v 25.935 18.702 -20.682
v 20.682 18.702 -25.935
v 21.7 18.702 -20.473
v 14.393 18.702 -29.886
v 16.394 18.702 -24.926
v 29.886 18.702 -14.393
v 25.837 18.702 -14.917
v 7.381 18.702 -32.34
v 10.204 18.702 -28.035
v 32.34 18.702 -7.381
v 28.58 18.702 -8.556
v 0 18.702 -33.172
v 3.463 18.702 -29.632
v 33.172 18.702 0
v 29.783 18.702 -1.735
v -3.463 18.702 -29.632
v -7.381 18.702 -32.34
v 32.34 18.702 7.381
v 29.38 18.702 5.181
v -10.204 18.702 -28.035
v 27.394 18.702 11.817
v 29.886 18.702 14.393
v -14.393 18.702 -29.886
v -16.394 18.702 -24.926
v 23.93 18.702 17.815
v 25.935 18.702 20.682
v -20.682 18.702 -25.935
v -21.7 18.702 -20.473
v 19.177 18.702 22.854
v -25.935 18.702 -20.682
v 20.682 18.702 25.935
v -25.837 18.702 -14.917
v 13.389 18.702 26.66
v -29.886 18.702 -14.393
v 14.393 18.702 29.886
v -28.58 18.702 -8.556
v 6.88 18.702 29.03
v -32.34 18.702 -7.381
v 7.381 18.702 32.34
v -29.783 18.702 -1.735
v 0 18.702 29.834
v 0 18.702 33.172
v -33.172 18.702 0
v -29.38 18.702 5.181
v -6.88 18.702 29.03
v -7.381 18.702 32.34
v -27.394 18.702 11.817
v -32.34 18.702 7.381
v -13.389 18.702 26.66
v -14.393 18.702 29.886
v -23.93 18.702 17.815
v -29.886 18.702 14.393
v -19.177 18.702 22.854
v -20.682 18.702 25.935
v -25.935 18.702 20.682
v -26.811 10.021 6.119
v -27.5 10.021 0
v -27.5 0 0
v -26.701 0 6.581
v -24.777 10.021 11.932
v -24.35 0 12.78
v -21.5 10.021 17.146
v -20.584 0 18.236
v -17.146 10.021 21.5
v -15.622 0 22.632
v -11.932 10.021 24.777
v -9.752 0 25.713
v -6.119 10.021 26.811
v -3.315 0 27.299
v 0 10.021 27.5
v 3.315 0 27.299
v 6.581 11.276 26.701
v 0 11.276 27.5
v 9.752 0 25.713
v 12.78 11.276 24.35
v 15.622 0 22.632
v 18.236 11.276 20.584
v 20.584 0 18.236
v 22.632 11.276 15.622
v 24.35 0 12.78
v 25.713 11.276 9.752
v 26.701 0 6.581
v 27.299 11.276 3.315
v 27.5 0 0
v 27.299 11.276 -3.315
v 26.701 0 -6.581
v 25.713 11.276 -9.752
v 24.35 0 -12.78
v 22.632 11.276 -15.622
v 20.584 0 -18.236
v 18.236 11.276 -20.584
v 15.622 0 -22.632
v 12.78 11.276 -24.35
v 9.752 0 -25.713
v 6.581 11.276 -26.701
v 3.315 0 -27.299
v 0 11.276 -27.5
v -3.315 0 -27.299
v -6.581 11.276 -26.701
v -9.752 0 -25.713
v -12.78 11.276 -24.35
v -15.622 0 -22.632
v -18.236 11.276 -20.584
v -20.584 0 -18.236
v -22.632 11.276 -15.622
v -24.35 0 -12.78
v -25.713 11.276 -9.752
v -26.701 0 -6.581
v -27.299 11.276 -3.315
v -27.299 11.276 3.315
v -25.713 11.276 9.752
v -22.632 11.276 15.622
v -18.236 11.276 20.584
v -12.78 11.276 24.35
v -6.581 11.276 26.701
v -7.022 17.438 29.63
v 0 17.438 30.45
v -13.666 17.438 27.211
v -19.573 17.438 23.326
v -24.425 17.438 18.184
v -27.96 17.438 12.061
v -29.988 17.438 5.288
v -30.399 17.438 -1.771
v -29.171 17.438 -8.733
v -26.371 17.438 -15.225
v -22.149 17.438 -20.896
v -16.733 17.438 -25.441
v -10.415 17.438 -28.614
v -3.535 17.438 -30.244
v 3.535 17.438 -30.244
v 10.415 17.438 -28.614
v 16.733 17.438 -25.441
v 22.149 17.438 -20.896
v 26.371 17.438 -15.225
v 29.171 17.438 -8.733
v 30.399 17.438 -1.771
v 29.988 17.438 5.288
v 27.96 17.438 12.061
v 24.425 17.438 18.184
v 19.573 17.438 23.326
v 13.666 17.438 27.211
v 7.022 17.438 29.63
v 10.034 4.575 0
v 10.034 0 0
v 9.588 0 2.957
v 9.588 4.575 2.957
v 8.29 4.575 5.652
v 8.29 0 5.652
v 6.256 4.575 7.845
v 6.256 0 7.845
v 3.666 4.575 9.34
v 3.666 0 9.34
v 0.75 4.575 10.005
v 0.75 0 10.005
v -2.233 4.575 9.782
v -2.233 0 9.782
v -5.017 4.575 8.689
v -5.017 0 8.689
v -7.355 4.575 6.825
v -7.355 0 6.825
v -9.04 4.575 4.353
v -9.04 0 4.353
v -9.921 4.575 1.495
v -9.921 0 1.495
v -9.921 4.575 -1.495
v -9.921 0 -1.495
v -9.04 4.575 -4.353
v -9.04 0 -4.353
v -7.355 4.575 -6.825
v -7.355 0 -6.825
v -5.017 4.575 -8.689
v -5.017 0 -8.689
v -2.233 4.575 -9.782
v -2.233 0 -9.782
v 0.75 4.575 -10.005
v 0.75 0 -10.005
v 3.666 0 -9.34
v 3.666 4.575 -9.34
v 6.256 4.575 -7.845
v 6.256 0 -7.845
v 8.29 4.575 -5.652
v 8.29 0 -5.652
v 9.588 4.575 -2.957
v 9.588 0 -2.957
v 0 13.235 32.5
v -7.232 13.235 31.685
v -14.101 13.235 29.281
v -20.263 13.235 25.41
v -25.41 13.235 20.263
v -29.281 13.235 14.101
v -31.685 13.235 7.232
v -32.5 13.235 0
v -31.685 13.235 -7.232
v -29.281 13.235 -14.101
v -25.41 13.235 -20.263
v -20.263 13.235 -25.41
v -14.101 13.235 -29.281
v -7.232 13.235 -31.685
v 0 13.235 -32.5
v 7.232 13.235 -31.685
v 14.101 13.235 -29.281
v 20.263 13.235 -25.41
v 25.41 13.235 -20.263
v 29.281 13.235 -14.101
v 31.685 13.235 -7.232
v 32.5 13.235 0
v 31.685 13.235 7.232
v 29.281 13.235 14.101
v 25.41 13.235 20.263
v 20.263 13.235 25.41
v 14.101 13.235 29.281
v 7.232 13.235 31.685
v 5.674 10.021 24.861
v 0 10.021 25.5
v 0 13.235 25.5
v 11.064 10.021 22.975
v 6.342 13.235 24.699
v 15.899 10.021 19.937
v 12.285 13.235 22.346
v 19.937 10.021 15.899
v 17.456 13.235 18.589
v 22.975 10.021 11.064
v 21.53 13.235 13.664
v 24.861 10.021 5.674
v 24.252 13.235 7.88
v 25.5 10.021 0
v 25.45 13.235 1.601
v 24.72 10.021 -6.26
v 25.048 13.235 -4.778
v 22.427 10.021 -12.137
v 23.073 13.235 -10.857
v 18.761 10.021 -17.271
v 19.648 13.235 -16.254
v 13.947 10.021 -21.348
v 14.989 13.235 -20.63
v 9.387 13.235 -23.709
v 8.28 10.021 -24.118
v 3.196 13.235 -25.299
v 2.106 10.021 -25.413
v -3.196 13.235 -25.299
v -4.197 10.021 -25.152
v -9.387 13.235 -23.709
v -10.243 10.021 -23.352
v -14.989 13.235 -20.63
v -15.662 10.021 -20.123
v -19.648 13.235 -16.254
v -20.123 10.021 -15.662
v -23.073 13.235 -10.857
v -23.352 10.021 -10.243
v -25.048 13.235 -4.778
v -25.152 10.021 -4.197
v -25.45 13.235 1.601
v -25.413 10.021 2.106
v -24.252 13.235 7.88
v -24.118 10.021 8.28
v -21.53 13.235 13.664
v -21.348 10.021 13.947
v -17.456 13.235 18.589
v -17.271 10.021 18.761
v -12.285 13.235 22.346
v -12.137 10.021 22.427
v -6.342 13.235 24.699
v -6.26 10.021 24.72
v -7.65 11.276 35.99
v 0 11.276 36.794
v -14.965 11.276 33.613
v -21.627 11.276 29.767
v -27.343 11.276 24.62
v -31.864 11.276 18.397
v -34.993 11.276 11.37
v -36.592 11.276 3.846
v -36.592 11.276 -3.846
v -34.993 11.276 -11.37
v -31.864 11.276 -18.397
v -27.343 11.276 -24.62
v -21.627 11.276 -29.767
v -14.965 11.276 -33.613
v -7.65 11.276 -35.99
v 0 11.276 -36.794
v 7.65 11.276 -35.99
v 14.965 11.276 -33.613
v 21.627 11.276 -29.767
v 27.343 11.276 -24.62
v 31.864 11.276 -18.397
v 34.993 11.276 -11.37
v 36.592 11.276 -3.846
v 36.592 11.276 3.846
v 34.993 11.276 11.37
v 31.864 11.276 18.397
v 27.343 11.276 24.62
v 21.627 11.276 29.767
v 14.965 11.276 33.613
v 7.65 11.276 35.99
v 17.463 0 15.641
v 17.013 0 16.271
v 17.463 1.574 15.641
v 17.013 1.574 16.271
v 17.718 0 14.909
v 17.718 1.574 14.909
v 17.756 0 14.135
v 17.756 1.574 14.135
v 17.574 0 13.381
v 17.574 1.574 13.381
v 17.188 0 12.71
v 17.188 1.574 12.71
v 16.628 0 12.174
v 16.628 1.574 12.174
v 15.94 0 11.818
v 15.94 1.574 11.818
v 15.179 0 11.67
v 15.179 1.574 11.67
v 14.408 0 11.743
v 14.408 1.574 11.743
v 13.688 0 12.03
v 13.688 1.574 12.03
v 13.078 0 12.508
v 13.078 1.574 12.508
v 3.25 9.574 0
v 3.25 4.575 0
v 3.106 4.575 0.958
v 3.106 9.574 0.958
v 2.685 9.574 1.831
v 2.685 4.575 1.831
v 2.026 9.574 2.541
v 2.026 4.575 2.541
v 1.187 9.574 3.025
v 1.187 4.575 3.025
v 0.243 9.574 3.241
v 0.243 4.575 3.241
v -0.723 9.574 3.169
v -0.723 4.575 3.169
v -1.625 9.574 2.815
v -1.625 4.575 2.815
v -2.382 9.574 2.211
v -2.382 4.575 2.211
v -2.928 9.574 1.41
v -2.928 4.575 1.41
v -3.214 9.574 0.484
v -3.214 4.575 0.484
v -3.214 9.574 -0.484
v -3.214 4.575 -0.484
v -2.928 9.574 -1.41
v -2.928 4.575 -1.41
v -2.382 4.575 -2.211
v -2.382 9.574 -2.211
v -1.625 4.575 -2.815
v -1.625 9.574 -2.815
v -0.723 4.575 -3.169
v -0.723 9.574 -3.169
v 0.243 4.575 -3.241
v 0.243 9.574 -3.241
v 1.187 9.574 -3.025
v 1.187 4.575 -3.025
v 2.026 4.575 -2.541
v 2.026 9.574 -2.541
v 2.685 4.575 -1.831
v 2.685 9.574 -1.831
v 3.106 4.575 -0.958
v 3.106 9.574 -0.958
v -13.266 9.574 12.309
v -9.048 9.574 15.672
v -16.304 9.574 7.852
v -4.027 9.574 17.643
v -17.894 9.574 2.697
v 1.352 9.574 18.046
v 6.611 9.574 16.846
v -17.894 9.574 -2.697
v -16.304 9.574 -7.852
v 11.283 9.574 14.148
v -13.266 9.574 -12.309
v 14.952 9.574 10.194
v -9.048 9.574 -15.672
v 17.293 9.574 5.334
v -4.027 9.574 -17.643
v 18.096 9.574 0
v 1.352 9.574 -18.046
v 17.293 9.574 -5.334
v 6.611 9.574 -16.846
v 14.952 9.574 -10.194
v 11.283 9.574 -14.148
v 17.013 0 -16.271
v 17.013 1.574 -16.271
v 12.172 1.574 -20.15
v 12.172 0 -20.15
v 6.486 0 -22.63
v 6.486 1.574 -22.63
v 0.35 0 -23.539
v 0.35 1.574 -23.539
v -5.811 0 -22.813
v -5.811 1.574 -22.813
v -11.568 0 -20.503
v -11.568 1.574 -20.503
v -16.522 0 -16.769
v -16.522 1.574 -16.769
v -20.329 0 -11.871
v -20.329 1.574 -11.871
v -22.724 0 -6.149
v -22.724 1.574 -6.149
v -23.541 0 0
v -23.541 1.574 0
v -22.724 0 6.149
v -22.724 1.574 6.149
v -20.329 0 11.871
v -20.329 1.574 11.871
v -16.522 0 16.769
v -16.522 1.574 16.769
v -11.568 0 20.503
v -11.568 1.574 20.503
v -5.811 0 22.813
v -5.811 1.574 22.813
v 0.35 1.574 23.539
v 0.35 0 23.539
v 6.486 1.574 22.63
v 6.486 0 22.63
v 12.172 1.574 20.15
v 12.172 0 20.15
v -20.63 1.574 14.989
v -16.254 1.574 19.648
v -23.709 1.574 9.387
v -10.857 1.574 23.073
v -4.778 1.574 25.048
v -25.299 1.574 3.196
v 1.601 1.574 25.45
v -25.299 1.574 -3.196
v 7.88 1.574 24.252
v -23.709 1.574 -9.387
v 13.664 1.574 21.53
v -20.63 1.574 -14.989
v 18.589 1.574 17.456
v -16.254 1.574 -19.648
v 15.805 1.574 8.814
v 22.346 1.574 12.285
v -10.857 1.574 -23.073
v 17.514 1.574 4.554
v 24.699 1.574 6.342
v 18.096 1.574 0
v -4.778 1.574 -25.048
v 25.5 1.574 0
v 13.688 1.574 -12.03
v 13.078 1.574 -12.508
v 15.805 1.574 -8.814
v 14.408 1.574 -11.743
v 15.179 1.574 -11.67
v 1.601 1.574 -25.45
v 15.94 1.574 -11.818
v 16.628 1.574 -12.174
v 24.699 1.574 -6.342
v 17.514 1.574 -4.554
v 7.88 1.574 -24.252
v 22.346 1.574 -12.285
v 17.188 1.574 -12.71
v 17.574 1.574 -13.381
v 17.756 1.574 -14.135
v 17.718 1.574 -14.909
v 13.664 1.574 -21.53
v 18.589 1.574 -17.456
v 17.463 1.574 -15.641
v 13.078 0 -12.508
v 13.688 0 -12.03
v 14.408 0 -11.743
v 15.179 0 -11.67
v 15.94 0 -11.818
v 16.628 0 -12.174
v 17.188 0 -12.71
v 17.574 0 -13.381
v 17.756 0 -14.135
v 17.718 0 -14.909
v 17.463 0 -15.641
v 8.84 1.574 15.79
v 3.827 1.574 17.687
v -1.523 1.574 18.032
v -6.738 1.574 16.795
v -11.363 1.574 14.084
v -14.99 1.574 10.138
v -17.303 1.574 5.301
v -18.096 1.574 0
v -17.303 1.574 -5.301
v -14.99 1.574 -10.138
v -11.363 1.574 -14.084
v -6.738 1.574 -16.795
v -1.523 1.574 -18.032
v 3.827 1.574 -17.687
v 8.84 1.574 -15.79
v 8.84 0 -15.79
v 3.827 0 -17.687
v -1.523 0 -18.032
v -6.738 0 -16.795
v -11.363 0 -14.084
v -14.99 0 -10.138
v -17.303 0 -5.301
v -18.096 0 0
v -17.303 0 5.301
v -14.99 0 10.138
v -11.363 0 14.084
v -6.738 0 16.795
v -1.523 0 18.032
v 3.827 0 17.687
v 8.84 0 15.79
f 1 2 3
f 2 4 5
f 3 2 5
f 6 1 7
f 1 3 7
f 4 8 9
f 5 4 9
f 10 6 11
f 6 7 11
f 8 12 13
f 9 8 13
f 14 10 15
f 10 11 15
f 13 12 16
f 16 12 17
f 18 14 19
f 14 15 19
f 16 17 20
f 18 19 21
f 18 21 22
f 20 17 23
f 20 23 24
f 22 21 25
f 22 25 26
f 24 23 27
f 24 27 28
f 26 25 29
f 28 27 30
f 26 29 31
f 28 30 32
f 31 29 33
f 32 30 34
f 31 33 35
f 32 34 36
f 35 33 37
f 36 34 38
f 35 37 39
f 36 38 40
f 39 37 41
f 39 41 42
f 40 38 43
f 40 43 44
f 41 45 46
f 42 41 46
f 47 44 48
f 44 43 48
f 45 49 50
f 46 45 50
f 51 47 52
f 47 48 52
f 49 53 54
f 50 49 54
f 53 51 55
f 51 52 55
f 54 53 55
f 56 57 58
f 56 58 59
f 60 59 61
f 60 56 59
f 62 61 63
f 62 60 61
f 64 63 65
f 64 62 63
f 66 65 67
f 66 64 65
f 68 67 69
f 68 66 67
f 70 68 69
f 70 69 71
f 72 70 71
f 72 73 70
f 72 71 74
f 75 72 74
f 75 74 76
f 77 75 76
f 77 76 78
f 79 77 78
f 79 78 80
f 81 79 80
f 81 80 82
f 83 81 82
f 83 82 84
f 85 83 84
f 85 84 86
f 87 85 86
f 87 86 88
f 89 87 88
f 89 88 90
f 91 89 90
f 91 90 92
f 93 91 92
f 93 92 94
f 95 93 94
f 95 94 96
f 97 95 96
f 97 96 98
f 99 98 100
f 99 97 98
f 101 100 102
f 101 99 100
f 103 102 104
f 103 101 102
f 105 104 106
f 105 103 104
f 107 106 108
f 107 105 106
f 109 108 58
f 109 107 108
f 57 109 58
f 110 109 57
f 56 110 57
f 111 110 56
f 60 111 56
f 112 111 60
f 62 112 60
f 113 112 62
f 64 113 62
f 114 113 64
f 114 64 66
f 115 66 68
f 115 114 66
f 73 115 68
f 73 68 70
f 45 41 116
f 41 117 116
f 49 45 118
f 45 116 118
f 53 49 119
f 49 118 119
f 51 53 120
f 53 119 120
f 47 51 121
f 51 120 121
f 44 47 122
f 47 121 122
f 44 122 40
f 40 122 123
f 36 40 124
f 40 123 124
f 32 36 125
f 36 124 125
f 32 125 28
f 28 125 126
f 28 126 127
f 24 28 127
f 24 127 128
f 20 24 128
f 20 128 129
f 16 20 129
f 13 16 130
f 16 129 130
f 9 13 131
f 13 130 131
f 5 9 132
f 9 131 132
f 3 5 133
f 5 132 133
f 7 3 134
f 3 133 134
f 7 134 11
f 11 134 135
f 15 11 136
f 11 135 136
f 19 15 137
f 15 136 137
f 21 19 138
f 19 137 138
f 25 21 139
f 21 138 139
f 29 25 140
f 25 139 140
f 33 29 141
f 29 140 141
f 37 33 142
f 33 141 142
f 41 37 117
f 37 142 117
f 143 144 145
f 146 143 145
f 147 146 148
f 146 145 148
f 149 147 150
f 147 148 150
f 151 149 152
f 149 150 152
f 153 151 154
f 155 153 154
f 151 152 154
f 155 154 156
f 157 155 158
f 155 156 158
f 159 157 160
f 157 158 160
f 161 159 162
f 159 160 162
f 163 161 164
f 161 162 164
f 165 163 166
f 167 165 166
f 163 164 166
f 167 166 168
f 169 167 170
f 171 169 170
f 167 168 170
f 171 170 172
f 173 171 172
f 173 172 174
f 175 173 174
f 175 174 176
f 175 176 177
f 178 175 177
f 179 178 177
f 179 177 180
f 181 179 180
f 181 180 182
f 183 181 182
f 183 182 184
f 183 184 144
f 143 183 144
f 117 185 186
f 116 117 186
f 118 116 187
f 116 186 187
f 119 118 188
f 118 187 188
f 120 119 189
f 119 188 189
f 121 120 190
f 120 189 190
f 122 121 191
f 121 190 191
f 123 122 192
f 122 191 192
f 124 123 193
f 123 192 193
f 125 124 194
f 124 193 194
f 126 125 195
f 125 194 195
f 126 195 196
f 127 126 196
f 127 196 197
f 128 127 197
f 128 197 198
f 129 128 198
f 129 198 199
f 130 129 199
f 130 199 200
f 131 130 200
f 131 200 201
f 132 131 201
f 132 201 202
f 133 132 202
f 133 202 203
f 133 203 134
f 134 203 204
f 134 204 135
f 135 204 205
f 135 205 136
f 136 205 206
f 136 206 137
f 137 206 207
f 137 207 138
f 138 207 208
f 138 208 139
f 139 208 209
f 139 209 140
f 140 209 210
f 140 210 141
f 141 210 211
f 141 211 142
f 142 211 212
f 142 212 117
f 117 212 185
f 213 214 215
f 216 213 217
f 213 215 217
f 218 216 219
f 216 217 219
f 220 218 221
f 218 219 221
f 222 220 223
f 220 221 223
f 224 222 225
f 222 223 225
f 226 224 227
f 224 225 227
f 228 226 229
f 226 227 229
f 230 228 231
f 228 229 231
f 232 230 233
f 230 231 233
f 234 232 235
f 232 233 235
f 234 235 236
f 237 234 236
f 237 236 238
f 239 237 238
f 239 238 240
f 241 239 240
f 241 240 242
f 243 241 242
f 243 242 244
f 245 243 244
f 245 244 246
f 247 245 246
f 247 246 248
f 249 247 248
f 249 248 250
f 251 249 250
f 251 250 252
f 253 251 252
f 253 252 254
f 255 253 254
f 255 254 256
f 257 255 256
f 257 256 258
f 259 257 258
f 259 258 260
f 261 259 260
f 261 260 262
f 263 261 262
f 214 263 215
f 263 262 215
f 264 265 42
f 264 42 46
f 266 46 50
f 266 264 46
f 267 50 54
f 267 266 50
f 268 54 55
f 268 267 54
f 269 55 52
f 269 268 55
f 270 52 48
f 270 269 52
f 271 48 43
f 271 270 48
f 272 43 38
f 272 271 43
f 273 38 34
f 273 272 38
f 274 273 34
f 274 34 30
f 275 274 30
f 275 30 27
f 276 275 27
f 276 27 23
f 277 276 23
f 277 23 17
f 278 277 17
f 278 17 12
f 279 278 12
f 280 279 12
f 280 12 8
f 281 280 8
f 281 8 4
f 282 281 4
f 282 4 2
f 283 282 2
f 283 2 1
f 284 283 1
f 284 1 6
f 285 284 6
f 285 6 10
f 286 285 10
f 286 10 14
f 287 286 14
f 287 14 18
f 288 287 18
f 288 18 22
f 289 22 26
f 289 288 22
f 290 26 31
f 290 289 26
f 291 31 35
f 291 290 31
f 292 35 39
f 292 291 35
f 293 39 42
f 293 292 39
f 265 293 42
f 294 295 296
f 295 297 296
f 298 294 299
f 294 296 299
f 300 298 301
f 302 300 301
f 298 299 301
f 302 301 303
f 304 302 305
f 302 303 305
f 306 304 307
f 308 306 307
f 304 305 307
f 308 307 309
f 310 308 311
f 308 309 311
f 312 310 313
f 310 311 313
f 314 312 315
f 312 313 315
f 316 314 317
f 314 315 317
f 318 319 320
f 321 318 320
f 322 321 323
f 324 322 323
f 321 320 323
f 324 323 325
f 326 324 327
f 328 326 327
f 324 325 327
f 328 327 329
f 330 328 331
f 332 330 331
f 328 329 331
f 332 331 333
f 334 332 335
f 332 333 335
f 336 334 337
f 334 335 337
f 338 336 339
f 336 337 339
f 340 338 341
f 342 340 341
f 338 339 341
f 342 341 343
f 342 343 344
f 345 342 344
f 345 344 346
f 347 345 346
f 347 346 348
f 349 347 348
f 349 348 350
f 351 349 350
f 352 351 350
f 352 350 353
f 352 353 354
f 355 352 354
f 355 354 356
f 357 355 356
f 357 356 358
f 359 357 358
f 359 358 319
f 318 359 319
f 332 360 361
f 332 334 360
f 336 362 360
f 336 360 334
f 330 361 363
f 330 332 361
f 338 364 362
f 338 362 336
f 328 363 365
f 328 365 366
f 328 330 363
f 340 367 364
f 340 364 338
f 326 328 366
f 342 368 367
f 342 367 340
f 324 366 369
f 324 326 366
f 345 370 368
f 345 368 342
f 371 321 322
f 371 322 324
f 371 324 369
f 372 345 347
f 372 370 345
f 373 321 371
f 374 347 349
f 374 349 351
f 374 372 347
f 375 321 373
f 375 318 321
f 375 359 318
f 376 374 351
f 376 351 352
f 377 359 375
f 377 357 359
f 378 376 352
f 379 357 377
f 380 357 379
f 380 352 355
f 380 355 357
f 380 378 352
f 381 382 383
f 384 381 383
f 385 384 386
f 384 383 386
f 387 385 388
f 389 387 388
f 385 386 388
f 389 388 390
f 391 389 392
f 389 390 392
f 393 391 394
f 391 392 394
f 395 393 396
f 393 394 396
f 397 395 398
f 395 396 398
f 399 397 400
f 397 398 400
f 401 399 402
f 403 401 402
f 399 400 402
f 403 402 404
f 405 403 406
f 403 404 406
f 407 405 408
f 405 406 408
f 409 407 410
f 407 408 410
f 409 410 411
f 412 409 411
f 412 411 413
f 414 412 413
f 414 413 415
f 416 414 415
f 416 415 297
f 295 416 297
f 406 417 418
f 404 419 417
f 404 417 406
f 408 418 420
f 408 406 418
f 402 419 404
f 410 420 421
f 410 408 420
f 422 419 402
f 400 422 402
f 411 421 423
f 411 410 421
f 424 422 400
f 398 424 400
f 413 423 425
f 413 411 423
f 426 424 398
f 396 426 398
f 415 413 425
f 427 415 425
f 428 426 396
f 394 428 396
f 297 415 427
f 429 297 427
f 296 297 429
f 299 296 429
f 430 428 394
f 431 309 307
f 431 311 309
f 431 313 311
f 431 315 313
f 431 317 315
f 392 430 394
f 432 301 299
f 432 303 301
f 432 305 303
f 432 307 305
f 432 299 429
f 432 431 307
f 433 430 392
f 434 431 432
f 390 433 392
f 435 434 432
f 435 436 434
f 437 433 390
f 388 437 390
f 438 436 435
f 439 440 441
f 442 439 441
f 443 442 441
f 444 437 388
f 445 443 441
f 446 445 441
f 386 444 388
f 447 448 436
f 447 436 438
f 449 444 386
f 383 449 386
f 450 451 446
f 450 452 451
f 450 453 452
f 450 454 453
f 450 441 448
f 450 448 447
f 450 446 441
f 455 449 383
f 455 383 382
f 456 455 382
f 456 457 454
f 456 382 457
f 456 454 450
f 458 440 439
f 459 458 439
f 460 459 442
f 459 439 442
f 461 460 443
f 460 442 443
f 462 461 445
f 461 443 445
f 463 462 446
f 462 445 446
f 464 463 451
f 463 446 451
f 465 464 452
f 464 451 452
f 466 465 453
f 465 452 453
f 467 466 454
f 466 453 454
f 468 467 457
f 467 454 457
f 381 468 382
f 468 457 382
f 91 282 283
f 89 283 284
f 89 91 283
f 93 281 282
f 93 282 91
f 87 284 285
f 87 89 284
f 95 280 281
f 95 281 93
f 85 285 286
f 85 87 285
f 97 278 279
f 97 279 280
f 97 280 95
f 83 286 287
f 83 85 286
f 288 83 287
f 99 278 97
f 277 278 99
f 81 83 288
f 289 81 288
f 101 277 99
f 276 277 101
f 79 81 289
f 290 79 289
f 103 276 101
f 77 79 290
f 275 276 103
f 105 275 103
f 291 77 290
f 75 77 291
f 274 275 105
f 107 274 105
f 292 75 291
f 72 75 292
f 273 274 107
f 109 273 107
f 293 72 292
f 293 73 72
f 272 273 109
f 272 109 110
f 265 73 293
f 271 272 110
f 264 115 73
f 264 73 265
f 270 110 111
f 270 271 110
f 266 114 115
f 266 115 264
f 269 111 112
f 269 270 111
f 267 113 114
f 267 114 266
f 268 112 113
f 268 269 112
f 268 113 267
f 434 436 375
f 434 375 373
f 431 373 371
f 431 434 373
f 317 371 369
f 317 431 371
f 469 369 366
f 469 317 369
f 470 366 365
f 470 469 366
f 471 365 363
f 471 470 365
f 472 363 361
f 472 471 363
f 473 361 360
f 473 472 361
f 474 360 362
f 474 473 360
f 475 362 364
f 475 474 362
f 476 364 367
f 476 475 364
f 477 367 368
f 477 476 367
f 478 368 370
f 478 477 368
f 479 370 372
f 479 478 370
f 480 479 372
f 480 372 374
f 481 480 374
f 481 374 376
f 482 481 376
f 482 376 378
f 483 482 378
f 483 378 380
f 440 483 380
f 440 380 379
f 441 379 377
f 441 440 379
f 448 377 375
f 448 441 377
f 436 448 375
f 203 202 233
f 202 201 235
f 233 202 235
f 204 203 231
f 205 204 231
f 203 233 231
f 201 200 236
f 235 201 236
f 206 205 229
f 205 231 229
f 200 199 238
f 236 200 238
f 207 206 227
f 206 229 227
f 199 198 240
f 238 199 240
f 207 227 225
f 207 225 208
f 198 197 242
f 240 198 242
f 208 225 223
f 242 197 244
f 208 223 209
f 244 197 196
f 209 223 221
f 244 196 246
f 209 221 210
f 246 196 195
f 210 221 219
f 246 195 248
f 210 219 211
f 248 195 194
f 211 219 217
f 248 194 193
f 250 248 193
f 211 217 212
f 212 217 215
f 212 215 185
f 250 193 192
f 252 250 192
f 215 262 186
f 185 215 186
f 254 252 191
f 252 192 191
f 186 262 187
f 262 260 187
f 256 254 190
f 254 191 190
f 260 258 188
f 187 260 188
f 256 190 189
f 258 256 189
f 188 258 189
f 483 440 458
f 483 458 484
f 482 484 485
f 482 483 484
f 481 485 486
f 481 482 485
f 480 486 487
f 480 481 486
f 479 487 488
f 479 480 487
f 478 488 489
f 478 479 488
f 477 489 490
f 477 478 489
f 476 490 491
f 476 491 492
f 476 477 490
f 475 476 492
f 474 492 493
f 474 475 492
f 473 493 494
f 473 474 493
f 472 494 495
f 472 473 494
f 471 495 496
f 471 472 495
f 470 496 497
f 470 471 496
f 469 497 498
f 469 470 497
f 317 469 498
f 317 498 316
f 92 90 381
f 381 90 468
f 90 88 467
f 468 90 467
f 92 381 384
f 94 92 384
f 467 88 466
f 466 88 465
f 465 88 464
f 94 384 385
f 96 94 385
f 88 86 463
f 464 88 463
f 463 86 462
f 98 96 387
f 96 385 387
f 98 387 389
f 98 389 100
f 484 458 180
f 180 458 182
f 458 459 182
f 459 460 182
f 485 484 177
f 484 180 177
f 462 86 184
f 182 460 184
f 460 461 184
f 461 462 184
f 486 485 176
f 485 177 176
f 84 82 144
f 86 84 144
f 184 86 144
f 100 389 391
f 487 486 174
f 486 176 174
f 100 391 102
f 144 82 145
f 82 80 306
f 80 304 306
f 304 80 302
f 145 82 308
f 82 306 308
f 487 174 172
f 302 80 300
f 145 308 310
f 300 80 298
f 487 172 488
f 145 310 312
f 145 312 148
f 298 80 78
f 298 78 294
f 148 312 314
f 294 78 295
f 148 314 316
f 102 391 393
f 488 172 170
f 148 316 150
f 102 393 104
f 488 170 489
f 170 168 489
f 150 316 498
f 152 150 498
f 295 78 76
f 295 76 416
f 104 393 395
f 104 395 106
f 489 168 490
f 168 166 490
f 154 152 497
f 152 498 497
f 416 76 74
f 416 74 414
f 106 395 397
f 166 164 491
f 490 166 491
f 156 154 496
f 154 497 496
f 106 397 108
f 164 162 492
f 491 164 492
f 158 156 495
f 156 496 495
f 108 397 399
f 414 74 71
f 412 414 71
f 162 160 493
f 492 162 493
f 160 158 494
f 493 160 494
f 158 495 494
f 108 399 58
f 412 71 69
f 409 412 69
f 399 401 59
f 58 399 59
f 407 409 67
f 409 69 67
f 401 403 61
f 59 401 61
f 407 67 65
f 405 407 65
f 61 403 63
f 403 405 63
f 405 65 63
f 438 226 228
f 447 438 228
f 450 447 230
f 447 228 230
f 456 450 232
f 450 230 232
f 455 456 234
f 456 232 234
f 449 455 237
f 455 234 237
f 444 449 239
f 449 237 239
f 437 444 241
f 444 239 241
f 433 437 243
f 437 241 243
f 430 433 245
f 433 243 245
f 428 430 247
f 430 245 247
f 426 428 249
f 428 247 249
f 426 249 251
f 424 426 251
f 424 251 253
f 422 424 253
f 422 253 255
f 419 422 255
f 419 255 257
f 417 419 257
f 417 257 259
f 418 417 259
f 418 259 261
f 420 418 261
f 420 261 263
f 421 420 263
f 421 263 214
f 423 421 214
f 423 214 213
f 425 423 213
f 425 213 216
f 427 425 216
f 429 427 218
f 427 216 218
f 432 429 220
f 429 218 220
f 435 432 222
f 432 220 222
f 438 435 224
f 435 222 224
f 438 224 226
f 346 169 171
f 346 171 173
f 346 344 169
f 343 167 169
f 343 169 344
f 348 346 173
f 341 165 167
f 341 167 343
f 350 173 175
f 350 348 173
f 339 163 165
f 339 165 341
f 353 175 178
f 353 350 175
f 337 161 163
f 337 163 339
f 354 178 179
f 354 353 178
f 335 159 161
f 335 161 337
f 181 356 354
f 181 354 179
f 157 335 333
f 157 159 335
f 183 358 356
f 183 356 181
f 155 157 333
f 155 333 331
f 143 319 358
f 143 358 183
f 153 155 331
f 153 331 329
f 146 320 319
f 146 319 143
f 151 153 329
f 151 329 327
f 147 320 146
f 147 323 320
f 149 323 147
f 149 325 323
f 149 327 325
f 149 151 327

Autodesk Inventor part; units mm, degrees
ref_plane "YZ Plane" through (0, 0, 0) normal (1, 0, 0) x (0, 1, 0)
ref_plane "XZ Plane" through (0, 0, 0) normal (0, 1, 0) x (-1, 0, 0)
ref_plane "XY Plane" through (0, 0, 0) normal (0, 0, 1) x (1, 0, 0)
sketch "Boceto1" plane through (0, 0, 0) normal (0, 1, 0) x (-1, 0, 0)
  circle A0 centre (0, 0) radius 27.5
  dimension "d0" = 55
extrude "Extrusión1" add sketch "Boceto1" along normal blind 10.021
sketch "Boceto2" plane through (0, 10.021, 0) normal (0, 1, 0) x (1, 0, 0)
  circle A0 centre (0, 0) radius 25.5
  dimension "d3" = 51
extrude "Extrusión2" cut sketch "Boceto2" against normal blind 8.447
sketch "Boceto3" plane through (0, 1.574, 0) normal (0, 1, 0) x (1, 0, 0)
  circle A0 centre (0, 0) radius 18.0965
  dimension "d6" = 36.193
extrude "Extrusión3" add sketch "Boceto3" along normal blind 8
sketch "Boceto6" plane through (0, 0, 0) normal (0, -1, 0) x (1, 0, 0)
  circle A0 centre (0, 0) radius 3.25
  dimension "d16" = 6.5
extrude "Extrusión6" cut sketch "Boceto6" against normal blind 10
sketch "Boceto7" plane through (0, 0, 0) normal (0, -1, 0) x (1, 0, 0)
  circle A0 centre (0, 0) radius 3.25 projected
  circle A1 centre (0, 0) radius 10.0335
  dimension "d19" = 20.067
extrude "Extrusión7" cut sketch "Boceto7" against normal blind 4.575
sketch "Boceto10" plane through (0, 0, 0) normal (1, 0, 0) x (0, 1, 0)
  line L0 (10.021, -27.5) -> (10.021, 27.5) projected
  line L1 (10.021, 27.5) -> (11.2756, 27.5)
  line L2 (11.2756, 27.5) -> (11.2756, 36.7936)
  line L3 (11.2756, 36.7936) -> (18.7019, 33.1715)
  line L4 (17.4376, 30.4503) -> (13.2352, 32.5)
  line L5 (10.021, 25.5) -> (1.574, 25.5) projected
  line L6 (10.021, 25.5) -> (13.2352, 25.5)
  line L7 (13.2352, 25.5) -> (13.2352, 32.5)
  line L8 (10.021, 27.5) -> (10.021, 25.5)
  line L9 (26.1838, 0) -> (-2.8727, 0)
  line L10 (17.4376, 30.4503) -> (18.7019, 29.8337)
  line L11 (18.7019, 29.8337) -> (18.7019, 33.1715)
  point P0 (0, 0)
  point P1 (20.2808, 32.4015)
  dimension "d29" = 64
  dimension "d30" = 3
  dimension "d32" = 7
revolve "Revolución1" add sketch "Boceto10" angle 360 about axis through (0, 26.1838, 0) along (0, -1, 0)
sketch "Boceto11" plane through (0, 1.574, 0) normal (0, 1, 0) x (1, 0, 0)
  arc A0 (13.0781, 12.5078) -> (13.0781, -12.5078) centre (0, 0) ccw
  arc A1 (17.0129, 16.271) -> (17.0129, -16.271) centre (0, 0) ccw
  arc A2 (17.0129, -16.271) -> (13.0781, -12.5078) centre (15.0455, -14.3894) ccw
  circle A3 centre (0, 0) radius 18.0965 projected
  arc A4 (13.0781, 12.5078) -> (17.0129, 16.271) centre (15.0455, 14.3894) ccw
extrude "Extrusión10" cut sketch "Boceto11" against normal blind 3 contours A0 A2 A1 A4
properties part number "Scroll_nuevo"
